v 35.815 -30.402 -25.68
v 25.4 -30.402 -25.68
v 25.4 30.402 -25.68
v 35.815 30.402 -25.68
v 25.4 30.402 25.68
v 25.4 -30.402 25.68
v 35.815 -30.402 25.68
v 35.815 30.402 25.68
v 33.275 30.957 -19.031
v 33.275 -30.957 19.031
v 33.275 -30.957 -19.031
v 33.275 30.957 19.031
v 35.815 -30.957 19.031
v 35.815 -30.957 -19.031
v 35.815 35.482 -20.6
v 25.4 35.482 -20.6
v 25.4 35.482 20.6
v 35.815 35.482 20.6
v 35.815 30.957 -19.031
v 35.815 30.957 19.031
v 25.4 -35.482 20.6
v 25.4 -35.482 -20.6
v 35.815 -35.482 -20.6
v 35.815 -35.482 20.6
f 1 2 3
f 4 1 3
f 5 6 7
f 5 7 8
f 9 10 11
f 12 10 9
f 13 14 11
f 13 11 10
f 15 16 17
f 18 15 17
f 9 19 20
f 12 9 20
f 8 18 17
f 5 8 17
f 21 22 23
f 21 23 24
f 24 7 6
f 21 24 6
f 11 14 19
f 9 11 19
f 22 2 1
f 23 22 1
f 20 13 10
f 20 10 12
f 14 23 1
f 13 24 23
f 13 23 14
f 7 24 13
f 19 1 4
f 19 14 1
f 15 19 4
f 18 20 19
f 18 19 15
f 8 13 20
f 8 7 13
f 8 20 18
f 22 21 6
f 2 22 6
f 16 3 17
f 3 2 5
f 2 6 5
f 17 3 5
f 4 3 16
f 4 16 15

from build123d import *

# Parameters (mm, degrees)
F0_W      = 70.9643363953
F0_H      = 51.3598918915
F1_DEPTH  = 76.2
F2_DEPTH  = 25.4
F3_DEPTH  = 40.3854846954
F4_DEPTH  = 25.4
F5_W      = 61.9144514203
F5_H      = 38.062274456
F6_DEPTH  = 2.54
F7_SIZE   = 5.08
F8_SIZE   = 5.08
F9_SIZE   = 5.08
F10_SIZE  = 5.08
F11_DEPTH = 25.4


with BuildPart() as f1:
    # F0 (on Right) → F1 (new body)
    with BuildSketch(Plane.YZ):
        Rectangle(F0_W, F0_H)
    extrude(amount=F1_DEPTH)

    # F2 (add): a face of the model
    f2_faces = [f1.faces().sort_by_distance(p)[0] for p in [
        (76.2, 0, 0),
    ]]
    extrude(f2_faces, amount=F2_DEPTH)

    # F3 (cut): a face of the model
    f3_faces = [f1.faces().sort_by_distance(p)[0] for p in [
        (101.6, 0, 0),
    ]]
    extrude(f3_faces, amount=-F3_DEPTH, mode=Mode.SUBTRACT)

    # F4 (cut): a face of the model
    f4_faces = [f1.faces().sort_by_distance(p)[0] for p in [
        (61.2145153046, 0, 0),
    ]]
    extrude(f4_faces, amount=-F4_DEPTH, mode=Mode.SUBTRACT)

    # F5 (on face) → F6 (cut)
    with BuildSketch(Plane.YZ.offset(35.8145153046)):
        Rectangle(F5_W, F5_H)
    extrude(amount=-F6_DEPTH, mode=Mode.SUBTRACT)

    # F7
    f7_edges = [f1.edges().sort_by_distance(p)[0] for p in [
        (17.907258, -35.482168, 25.679946),
    ]]
    chamfer(f7_edges, length=F7_SIZE)

    # F8
    f8_edges = [f1.edges().sort_by_distance(p)[0] for p in [
        (17.907258, -35.482168, -25.679946),
    ]]
    chamfer(f8_edges, length=F8_SIZE)

    # F9
    f9_edges = [f1.edges().sort_by_distance(p)[0] for p in [
        (17.907258, 35.482168, 25.679946),
    ]]
    chamfer(f9_edges, length=F9_SIZE)

    # F10
    f10_edges = [f1.edges().sort_by_distance(p)[0] for p in [
        (17.907258, 35.482168, -25.679946),
    ]]
    chamfer(f10_edges, length=F10_SIZE)

    # F11 (cut): a face of the model
    f11_faces = [f1.faces().sort_by_distance(p)[0] for p in [
        (0, 0, 0),
    ]]
    extrude(f11_faces, amount=-F11_DEPTH, mode=Mode.SUBTRACT)


solid = f1.part
